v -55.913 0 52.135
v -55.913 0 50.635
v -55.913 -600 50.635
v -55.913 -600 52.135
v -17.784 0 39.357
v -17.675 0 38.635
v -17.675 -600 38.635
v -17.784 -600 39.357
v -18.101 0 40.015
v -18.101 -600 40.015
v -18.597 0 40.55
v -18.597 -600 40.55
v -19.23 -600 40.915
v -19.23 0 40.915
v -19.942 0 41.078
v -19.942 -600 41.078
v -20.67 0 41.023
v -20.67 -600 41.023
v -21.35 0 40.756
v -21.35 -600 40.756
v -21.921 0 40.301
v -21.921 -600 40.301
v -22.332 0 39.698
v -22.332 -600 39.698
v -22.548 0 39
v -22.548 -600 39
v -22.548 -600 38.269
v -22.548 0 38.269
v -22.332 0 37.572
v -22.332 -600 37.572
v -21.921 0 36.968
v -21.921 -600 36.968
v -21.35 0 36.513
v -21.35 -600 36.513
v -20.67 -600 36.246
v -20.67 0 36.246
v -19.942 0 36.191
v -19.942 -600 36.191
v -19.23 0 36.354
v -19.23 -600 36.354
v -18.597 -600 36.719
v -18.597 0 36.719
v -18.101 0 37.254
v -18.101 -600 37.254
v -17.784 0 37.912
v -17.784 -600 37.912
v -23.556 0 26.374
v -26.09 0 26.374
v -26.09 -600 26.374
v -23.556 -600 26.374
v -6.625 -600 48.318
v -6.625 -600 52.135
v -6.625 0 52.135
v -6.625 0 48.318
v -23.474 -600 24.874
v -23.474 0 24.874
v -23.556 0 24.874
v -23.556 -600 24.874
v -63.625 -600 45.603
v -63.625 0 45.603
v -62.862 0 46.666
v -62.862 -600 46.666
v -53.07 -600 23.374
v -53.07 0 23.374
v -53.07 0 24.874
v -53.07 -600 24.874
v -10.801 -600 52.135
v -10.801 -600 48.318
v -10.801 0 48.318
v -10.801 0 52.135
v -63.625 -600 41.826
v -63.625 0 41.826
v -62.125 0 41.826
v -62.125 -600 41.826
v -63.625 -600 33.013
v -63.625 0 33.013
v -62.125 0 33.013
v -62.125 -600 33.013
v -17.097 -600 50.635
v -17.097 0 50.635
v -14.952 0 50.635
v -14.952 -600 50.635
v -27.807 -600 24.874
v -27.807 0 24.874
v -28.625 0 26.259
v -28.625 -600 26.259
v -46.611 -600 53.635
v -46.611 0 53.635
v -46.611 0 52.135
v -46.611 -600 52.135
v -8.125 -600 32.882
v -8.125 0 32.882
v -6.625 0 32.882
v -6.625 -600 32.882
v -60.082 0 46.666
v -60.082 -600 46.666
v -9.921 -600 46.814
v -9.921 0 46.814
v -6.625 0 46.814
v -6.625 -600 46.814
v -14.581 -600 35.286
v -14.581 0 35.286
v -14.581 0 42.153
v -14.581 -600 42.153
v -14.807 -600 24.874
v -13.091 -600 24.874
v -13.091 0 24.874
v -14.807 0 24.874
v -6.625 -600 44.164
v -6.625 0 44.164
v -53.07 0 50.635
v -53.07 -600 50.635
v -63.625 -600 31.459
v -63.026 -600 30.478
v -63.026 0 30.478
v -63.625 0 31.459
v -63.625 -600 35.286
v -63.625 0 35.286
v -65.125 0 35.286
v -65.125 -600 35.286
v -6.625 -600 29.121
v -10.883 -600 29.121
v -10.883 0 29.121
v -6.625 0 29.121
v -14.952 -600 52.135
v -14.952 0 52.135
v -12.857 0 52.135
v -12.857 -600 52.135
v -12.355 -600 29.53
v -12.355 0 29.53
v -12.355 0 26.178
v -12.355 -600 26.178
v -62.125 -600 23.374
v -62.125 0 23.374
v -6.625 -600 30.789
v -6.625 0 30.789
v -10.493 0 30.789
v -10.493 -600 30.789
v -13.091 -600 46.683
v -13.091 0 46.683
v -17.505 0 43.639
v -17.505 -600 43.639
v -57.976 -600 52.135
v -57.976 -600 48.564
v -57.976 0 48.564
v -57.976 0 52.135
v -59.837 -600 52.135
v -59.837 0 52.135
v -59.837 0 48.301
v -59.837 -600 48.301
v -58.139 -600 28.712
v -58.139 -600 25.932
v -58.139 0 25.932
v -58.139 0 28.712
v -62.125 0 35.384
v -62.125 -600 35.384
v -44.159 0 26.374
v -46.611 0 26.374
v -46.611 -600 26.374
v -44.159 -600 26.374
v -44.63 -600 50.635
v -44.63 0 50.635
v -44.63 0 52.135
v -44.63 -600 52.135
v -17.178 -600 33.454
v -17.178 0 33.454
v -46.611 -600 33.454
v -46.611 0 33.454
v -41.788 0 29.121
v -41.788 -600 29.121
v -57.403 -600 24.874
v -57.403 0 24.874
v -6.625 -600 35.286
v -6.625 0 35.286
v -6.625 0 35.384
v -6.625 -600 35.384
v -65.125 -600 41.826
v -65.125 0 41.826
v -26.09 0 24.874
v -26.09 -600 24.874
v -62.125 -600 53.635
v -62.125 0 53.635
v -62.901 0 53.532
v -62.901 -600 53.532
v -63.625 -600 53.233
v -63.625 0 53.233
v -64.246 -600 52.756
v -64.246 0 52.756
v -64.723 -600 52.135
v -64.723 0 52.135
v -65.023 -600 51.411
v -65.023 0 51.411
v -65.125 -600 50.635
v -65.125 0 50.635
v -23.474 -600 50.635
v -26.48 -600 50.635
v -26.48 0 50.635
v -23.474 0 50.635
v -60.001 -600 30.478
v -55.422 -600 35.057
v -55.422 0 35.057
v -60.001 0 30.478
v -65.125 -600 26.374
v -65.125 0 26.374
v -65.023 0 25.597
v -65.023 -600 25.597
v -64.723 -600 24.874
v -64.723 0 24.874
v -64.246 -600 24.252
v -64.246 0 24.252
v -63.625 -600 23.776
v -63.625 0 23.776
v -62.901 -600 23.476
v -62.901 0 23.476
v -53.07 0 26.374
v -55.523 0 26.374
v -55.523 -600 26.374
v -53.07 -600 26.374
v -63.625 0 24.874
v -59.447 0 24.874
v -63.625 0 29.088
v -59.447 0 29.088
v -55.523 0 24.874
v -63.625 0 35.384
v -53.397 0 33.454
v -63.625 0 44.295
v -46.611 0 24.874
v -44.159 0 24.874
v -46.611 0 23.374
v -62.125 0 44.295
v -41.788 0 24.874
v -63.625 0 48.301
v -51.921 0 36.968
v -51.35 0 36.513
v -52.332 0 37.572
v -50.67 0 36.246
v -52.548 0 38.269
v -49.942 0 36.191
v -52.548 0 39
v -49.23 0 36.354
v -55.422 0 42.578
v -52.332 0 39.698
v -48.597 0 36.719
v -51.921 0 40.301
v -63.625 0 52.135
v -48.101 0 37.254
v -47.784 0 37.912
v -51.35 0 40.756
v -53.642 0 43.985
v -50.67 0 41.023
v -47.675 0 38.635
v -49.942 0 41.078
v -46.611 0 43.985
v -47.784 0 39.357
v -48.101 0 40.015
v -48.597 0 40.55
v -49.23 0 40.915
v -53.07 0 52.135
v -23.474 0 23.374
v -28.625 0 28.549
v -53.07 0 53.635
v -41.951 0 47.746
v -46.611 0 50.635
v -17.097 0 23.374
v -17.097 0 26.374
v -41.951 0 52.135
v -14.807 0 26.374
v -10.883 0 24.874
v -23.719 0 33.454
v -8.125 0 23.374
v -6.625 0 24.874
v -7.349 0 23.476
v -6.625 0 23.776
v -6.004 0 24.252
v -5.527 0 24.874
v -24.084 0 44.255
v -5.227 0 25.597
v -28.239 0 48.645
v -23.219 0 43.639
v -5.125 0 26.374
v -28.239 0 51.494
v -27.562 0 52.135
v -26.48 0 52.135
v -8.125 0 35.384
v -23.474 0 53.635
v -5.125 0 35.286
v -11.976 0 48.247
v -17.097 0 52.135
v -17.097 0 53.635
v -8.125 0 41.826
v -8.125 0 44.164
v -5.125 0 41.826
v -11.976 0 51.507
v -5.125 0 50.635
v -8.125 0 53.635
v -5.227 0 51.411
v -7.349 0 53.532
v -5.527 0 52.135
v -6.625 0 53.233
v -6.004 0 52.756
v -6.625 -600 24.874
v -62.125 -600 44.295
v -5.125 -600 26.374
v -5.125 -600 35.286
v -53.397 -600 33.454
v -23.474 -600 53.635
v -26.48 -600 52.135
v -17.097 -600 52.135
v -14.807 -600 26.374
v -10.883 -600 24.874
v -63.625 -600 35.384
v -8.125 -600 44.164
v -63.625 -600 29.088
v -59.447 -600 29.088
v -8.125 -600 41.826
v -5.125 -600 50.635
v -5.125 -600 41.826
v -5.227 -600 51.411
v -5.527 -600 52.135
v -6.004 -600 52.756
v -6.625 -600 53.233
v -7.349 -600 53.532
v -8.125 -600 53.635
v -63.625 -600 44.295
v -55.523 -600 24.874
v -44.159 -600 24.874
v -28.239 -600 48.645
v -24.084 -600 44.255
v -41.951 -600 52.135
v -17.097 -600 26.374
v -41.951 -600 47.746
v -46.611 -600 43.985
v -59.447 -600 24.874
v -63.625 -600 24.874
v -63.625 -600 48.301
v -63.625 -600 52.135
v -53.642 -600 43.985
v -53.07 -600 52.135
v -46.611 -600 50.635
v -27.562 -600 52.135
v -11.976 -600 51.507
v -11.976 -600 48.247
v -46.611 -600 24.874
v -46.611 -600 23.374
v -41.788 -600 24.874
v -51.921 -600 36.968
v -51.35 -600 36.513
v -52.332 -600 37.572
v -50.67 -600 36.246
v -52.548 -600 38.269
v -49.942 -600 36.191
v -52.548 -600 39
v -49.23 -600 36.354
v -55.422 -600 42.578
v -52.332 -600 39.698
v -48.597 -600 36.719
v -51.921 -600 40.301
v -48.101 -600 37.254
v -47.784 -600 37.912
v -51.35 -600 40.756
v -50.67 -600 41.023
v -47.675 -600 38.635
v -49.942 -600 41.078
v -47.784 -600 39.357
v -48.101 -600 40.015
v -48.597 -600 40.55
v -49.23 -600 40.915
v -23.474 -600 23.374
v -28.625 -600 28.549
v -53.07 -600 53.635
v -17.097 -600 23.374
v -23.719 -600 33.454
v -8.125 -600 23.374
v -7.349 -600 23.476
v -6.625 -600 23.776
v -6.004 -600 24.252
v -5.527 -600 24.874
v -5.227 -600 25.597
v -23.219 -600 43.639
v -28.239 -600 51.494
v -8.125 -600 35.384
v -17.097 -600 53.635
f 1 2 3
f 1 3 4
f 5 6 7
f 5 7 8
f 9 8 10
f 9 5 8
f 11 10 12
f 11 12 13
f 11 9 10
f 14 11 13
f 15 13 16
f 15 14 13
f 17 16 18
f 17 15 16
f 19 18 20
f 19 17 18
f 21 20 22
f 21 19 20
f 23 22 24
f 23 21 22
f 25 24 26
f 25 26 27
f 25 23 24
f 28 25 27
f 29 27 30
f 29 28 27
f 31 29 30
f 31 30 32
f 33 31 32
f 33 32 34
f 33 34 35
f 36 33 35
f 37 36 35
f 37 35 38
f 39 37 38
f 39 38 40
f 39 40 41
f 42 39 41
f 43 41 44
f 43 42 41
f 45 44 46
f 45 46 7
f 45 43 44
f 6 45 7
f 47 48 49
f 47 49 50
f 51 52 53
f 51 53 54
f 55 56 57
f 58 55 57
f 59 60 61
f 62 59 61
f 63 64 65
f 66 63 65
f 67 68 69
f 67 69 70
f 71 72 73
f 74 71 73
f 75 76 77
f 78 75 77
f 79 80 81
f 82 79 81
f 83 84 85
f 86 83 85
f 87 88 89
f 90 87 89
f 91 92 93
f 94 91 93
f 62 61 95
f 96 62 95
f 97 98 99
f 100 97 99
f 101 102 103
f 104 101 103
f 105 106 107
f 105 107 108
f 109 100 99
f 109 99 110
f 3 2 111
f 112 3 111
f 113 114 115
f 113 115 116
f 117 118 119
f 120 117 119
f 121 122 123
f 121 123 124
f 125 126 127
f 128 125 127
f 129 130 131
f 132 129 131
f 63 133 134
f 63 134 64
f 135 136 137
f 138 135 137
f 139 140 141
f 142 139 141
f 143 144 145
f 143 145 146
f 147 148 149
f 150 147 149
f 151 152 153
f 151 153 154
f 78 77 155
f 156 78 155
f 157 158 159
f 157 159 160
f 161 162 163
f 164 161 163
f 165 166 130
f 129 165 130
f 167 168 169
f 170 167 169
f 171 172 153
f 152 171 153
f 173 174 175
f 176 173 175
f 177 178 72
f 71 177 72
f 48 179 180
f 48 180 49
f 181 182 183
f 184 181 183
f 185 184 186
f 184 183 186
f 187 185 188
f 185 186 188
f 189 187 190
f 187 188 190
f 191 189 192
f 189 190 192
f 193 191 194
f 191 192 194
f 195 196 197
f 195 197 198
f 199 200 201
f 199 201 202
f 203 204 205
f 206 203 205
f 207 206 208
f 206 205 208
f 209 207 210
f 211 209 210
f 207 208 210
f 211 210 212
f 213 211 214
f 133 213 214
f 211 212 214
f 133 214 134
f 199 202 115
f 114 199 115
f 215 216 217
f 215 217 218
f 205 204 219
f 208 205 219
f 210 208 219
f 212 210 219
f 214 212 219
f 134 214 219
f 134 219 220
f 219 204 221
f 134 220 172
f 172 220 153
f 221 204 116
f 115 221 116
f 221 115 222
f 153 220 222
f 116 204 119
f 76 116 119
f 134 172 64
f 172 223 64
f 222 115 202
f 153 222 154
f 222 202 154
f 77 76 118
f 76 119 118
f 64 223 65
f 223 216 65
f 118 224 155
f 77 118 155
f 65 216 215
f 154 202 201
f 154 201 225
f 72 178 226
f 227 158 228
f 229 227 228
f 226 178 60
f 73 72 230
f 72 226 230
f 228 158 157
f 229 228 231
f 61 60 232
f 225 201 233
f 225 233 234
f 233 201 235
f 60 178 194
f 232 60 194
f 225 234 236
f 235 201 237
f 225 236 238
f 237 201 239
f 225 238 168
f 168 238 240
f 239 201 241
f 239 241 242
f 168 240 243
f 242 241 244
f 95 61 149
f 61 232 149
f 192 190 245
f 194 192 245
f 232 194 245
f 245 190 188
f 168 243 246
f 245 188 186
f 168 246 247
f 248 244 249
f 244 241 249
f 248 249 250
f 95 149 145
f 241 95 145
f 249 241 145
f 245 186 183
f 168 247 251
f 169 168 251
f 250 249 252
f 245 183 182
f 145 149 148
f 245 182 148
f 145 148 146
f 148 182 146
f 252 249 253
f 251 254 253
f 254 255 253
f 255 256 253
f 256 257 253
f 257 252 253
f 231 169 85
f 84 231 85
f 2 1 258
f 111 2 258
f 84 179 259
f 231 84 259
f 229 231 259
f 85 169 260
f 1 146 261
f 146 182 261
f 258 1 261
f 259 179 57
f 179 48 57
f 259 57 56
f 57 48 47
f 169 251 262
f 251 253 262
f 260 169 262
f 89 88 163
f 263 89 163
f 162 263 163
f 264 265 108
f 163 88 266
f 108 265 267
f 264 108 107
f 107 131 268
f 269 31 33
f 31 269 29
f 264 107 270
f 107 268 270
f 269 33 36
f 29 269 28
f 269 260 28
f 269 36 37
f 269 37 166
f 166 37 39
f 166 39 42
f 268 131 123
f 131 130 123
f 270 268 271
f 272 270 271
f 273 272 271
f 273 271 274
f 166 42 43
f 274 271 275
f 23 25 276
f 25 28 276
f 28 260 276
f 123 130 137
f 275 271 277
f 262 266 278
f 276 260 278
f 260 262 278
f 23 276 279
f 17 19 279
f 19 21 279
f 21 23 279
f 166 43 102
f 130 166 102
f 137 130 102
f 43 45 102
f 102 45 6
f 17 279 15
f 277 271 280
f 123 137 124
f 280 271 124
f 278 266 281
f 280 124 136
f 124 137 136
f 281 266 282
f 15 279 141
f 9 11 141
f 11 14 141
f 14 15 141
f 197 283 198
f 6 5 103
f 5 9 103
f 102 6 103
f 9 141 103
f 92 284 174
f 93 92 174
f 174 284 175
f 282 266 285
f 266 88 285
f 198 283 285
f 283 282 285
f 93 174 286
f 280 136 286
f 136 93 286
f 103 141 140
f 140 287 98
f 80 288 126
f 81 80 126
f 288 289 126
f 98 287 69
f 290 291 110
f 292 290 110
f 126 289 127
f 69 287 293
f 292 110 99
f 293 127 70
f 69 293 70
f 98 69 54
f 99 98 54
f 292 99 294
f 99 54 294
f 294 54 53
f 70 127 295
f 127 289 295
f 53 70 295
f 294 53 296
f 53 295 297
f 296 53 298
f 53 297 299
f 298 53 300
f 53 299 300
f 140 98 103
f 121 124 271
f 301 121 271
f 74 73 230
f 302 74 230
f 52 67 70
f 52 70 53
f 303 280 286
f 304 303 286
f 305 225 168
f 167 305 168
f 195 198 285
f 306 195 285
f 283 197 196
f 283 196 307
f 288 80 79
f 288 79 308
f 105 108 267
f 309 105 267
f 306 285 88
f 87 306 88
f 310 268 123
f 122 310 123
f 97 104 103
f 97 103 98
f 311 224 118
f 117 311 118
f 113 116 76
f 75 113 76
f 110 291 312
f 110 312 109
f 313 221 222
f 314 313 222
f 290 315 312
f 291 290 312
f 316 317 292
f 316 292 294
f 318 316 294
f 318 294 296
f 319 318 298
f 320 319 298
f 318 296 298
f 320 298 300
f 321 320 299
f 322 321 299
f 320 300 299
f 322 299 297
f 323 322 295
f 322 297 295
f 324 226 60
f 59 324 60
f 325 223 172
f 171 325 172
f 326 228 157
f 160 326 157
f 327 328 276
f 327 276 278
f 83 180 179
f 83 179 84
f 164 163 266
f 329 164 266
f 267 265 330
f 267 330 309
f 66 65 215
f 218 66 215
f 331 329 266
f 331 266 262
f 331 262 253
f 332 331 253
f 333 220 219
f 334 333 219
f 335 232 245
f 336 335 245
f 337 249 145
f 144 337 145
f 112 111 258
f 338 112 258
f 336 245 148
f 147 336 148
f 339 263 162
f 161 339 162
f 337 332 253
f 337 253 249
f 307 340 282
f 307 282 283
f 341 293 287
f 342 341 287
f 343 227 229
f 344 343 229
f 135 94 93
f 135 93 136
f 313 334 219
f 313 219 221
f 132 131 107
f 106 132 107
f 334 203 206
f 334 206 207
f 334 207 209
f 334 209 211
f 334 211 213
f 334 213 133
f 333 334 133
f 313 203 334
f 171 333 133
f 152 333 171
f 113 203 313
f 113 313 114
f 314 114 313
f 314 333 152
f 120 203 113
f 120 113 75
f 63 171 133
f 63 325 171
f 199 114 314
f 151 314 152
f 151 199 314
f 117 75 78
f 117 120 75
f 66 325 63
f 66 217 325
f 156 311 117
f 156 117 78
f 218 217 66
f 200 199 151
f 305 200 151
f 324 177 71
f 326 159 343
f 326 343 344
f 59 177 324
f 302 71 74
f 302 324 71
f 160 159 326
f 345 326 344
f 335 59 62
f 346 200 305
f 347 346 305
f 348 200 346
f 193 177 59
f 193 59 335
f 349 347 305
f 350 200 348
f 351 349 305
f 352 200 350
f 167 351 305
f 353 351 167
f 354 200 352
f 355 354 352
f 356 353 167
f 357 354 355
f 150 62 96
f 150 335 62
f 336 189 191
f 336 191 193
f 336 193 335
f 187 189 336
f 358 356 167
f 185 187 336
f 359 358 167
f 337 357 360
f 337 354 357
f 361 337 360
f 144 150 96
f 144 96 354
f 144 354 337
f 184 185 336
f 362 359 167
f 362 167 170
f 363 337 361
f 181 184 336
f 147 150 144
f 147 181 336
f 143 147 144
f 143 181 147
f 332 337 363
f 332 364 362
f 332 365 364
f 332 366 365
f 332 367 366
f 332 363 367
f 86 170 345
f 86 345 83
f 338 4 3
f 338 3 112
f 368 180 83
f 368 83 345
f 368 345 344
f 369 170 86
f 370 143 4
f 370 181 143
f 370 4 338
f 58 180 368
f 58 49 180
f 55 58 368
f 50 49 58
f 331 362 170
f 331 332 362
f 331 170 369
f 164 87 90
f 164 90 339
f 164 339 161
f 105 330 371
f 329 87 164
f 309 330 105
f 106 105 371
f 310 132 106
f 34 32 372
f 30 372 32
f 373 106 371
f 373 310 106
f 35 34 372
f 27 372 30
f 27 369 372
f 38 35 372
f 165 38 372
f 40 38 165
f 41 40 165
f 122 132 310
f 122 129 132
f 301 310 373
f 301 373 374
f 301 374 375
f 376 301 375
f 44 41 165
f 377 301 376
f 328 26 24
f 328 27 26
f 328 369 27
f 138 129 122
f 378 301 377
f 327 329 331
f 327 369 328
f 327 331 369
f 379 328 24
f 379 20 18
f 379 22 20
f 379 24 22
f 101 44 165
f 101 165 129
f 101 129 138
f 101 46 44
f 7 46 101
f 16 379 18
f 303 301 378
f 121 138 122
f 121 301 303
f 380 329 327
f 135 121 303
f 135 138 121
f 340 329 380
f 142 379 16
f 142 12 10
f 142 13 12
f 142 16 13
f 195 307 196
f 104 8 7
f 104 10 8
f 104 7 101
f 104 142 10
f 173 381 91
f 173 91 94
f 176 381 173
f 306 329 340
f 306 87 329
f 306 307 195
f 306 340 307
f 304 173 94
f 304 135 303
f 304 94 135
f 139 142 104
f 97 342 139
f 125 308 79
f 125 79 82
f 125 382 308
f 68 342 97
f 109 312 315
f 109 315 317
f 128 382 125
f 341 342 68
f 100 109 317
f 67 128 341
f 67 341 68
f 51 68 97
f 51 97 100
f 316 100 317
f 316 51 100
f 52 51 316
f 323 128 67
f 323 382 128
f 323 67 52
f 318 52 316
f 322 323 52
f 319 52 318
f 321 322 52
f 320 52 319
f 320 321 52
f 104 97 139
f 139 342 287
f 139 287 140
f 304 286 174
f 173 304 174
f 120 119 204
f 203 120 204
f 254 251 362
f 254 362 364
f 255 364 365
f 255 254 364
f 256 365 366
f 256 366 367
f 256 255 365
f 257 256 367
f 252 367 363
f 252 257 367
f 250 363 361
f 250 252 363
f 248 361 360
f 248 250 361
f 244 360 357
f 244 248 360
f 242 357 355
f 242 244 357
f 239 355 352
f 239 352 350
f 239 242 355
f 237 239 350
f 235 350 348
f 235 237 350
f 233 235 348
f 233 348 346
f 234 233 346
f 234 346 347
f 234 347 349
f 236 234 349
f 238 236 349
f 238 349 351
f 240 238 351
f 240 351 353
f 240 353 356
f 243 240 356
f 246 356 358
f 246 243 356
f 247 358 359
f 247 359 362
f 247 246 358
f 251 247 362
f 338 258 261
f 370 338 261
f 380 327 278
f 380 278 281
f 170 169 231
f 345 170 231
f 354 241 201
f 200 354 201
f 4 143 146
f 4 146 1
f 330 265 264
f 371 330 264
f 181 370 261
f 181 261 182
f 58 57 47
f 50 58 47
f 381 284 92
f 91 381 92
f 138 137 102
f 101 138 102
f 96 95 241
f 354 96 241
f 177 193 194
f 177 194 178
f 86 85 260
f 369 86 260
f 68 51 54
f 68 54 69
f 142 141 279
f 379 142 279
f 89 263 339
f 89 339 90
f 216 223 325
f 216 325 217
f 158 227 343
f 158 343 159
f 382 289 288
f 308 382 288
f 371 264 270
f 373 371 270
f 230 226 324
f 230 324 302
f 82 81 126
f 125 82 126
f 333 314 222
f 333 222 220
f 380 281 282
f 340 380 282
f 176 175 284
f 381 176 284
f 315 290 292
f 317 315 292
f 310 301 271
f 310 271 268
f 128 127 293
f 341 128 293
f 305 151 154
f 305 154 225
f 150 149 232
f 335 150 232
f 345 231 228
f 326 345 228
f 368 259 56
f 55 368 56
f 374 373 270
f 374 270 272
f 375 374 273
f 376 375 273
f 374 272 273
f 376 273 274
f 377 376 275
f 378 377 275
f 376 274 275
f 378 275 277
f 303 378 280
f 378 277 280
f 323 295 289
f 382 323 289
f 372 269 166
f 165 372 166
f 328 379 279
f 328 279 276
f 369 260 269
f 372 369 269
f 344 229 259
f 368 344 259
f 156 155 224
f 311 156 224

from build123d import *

# Parameters (mm, degrees)
F0_R     = 2.45
F0_W     = 1.981159
F0_H     = 1.5
F0_W_2   = 2.842553
F0_W_3   = 1.5
F0_H_2   = 2.468955
F0_W_4   = 2.452735
F0_W_5   = 2.534492
F0_W_6   = 2.289216
F0_H_3   = 2.337886
F0_W_7   = 2.144671
F0_W_8   = 3.006068
F1_DEPTH = 600


with BuildPart() as f1:
    # F0 (on Front) → F1 (new body)
    with BuildSketch(Plane.XZ):
        with BuildLine():
            Line((-53.070132, 53.634533), (-62.125003, 53.634533))
            ThreePointArc((-62.125003, 53.634533), (-64.246324, 52.755854), (-65.125003, 50.634533))
            Line((-65.125003, 50.634533), (-65.125003, 41.826408))
            Line((-65.125003, 41.826408), (-63.625003, 41.826408))
            Line((-63.625003, 41.826408), (-63.625003, 44.295363))
            Line((-63.625003, 44.295363), (-63.625003, 45.603488))
            Line((-63.625003, 45.603488), (-63.625003, 48.301496))
            Line((-63.625003, 48.301496), (-63.625003, 51.134533))
            Line((-63.625003, 51.134533), (-63.625003, 52.134533))
            Line((-63.625003, 52.134533), (-62.625003, 52.134533))
            Line((-62.625003, 52.134533), (-59.837058, 52.134533))
            Line((-59.837058, 52.134533), (-57.975602, 52.134533))
            Line((-57.975602, 52.134533), (-55.912685, 52.134533))
            Line((-55.912685, 52.134533), (-53.070132, 52.134533))
            Line((-53.070132, 52.134533), (-53.070132, 53.634533))
        make_face()
        Polygon((-23.473811, 53.634533), (-46.611269, 53.634533), (-46.611269, 52.134533), (-44.63011, 52.134533), (-41.951072, 52.134533), (-38.108457, 52.134533), (-32.058381, 52.134533), (-27.561702, 52.134533), (-26.479879, 52.134533), (-23.473811, 52.134533), align=None)
        with BuildLine():
            Line((-8.125003, 53.634533), (-17.096702, 53.634533))
            Line((-17.096702, 53.634533), (-17.096702, 52.134533))
            Line((-17.096702, 52.134533), (-14.952031, 52.134533))
            Line((-14.952031, 52.134533), (-12.857073, 52.134533))
            Line((-12.857073, 52.134533), (-10.801355, 52.134533))
            Line((-10.801355, 52.134533), (-7.625003, 52.134533))
            Line((-7.625003, 52.134533), (-6.625003, 52.134533))
            Line((-6.625003, 52.134533), (-6.625003, 51.134533))
            Line((-6.625003, 51.134533), (-6.625003, 48.318361))
            Line((-6.625003, 48.318361), (-6.625003, 46.813633))
            Line((-6.625003, 46.813633), (-6.625003, 44.164294))
            Line((-6.625003, 44.164294), (-6.625003, 41.826408))
            Line((-6.625003, 41.826408), (-5.125003, 41.826408))
            Line((-5.125003, 41.826408), (-5.125003, 50.634533))
            ThreePointArc((-5.125003, 50.634533), (-6.003683, 52.755854), (-8.125003, 53.634533))
        make_face()
        with BuildLine():
            Line((-63.625003, 35.285785), (-65.125003, 35.285785))
            Line((-65.125003, 35.285785), (-65.125003, 26.373664))
            ThreePointArc((-65.125003, 26.373664), (-64.246324, 24.252343), (-62.125003, 23.373664))
            Line((-62.125003, 23.373664), (-53.070132, 23.373664))
            Line((-53.070132, 23.373664), (-53.070132, 24.873664))
            Line((-53.070132, 24.873664), (-55.522867, 24.873664))
            Line((-55.522867, 24.873664), (-57.403297, 24.873664))
            Line((-57.403297, 24.873664), (-59.447241, 24.873664))
            Line((-59.447241, 24.873664), (-62.625003, 24.873664))
            Line((-62.625003, 24.873664), (-63.625003, 24.873664))
            Line((-63.625003, 24.873664), (-63.625003, 25.873664))
            Line((-63.625003, 25.873664), (-63.625003, 29.088415))
            Line((-63.625003, 29.088415), (-63.625003, 31.459391))
            Line((-63.625003, 31.459391), (-63.625003, 33.012789))
            Line((-63.625003, 33.012789), (-63.625003, 35.285785))
        make_face()
        Polygon((-46.611269, 24.873664), (-46.611269, 23.373664), (-23.473811, 23.373664), (-23.473811, 24.873664), (-23.55557, 24.873664), (-26.090062, 24.873664), (-27.806975, 24.873664), (-31.894863, 24.873664), (-38.35373, 24.873664), (-41.787558, 24.873664), (-44.158534, 24.873664), align=None)
        with BuildLine():
            Line((-5.125003, 26.373664), (-5.125003, 35.285785))
            Line((-5.125003, 35.285785), (-6.625003, 35.285785))
            Line((-6.625003, 35.285785), (-6.625003, 32.88172))
            Line((-6.625003, 32.88172), (-6.625003, 30.789106))
            Line((-6.625003, 30.789106), (-6.625003, 29.120862))
            Line((-6.625003, 29.120862), (-6.625003, 25.773664))
            Line((-6.625003, 25.773664), (-6.625003, 24.873664))
            Line((-6.625003, 24.873664), (-7.525003, 24.873664))
            Line((-7.525003, 24.873664), (-10.883111, 24.873664))
            Line((-10.883111, 24.873664), (-13.090572, 24.873664))
            Line((-13.090572, 24.873664), (-14.807486, 24.873664))
            Line((-14.807486, 24.873664), (-17.096702, 24.873664))
            Line((-17.096702, 24.873664), (-17.096702, 23.373664))
            Line((-17.096702, 23.373664), (-8.125003, 23.373664))
            ThreePointArc((-8.125003, 23.373664), (-6.003683, 24.252343), (-5.125003, 26.373664))
        make_face()
        Polygon((-28.238816, 51.493694), (-27.561702, 52.134533), (-32.058381, 52.134533), (-38.108457, 52.134533), (-40.070646, 50.607581), (-40.070646, 47.991332), (-41.133494, 46.110899), (-44.240293, 43.004104), (-45.057871, 41.695979), (-45.057871, 35.891176), (-44.076775, 34.256019), (-40.888221, 30.98571), (-39.988887, 29.10528), (-39.988887, 27.63364), (-39.253068, 26.325515), (-38.35373, 24.873664), (-31.894863, 24.873664), (-27.806975, 24.873664), (-28.624554, 26.259338), (-28.624554, 28.548557), (-23.719084, 33.454025), (-17.178463, 33.454025), (-12.354753, 29.529651), (-12.354753, 26.177581), (-13.090572, 24.873664), (-10.883111, 24.873664), (-10.883111, 29.120862), (-6.625003, 29.120862), (-6.625003, 30.789106), (-10.493293, 30.789106), (-14.581185, 35.285785), (-14.581185, 42.15344), (-9.920991, 46.813633), (-6.625003, 46.813633), (-6.625003, 48.318361), (-10.801355, 48.318361), (-10.801355, 52.134533), (-12.857073, 52.134533), (-11.976291, 51.506915), (-11.976291, 48.246956), (-13.090572, 46.683204), (-17.505493, 43.638769), (-23.21886, 43.638769), (-24.083539, 44.254912), (-28.238816, 48.645393), align=None)
        with Locations((-20.125003, 38.634533)):
            Circle(F0_R, mode=Mode.SUBTRACT)
        Polygon((-57.975602, 48.563634), (-57.975602, 52.134533), (-59.837058, 52.134533), (-59.837058, 48.301496), (-63.625003, 48.301496), (-63.625003, 45.603488), (-62.862098, 46.666339), (-60.082331, 46.666339), (-55.422138, 42.578451), (-55.422138, 35.056733), (-60.000576, 30.478297), (-63.025609, 30.478297), (-63.625003, 31.459391), (-63.625003, 29.088415), (-59.447241, 29.088415), (-59.447241, 24.873664), (-57.403297, 24.873664), (-58.139116, 25.932308), (-58.139116, 28.712073), (-53.397164, 33.454025), (-46.611269, 33.454025), (-41.787558, 29.120862), (-41.787558, 25.687035), (-41.787558, 24.873664), (-38.35373, 24.873664), (-39.253068, 26.325515), (-39.988887, 27.63364), (-39.988887, 29.10528), (-40.888221, 30.98571), (-44.076775, 34.256019), (-45.057871, 35.891176), (-45.057871, 41.695979), (-44.240293, 43.004104), (-41.133494, 46.110899), (-40.070646, 47.991332), (-40.070646, 50.607581), (-38.108457, 52.134533), (-41.951072, 52.134533), (-41.951072, 47.746059), (-46.611269, 43.985196), (-53.642437, 43.985196), align=None)
        with Locations((-50.125003, 38.634533)):
            Circle(F0_R, mode=Mode.SUBTRACT)
        with Locations((-45.620689, 51.384533)):
            Rectangle(F0_W, F0_H)
        with Locations((-54.491408, 51.384533)):
            Rectangle(F0_W_2, F0_H)
        with Locations((-62.875003, 43.060885)):
            Rectangle(F0_W_3, F0_H_2)
        Polygon((-63.625003, 35.383765), (-63.625003, 35.285785), (-63.625003, 33.012789), (-62.125003, 33.012789), (-62.125003, 35.383765), align=None)
        with Locations((-54.296499, 25.623664)):
            Rectangle(F0_W_4, F0_H)
        with Locations((-45.384901, 25.623664)):
            Rectangle(F0_W_4, F0_H)
        with Locations((-24.822816, 25.623664)):
            Rectangle(F0_W_5, F0_H)
        with Locations((-15.952094, 25.623664)):
            Rectangle(F0_W_6, F0_H)
        Polygon((-6.625003, 32.88172), (-6.625003, 35.285785), (-6.625003, 35.383765), (-8.125003, 35.383765), (-8.125003, 32.88172), align=None)
        with Locations((-7.375003, 42.995351)):
            Rectangle(F0_W_3, F0_H_3)
        with Locations((-16.024366, 51.384533)):
            Rectangle(F0_W_7, F0_H)
        with Locations((-24.976845, 51.384533)):
            Rectangle(F0_W_8, F0_H)
    extrude(amount=F1_DEPTH)


solid = f1.part
